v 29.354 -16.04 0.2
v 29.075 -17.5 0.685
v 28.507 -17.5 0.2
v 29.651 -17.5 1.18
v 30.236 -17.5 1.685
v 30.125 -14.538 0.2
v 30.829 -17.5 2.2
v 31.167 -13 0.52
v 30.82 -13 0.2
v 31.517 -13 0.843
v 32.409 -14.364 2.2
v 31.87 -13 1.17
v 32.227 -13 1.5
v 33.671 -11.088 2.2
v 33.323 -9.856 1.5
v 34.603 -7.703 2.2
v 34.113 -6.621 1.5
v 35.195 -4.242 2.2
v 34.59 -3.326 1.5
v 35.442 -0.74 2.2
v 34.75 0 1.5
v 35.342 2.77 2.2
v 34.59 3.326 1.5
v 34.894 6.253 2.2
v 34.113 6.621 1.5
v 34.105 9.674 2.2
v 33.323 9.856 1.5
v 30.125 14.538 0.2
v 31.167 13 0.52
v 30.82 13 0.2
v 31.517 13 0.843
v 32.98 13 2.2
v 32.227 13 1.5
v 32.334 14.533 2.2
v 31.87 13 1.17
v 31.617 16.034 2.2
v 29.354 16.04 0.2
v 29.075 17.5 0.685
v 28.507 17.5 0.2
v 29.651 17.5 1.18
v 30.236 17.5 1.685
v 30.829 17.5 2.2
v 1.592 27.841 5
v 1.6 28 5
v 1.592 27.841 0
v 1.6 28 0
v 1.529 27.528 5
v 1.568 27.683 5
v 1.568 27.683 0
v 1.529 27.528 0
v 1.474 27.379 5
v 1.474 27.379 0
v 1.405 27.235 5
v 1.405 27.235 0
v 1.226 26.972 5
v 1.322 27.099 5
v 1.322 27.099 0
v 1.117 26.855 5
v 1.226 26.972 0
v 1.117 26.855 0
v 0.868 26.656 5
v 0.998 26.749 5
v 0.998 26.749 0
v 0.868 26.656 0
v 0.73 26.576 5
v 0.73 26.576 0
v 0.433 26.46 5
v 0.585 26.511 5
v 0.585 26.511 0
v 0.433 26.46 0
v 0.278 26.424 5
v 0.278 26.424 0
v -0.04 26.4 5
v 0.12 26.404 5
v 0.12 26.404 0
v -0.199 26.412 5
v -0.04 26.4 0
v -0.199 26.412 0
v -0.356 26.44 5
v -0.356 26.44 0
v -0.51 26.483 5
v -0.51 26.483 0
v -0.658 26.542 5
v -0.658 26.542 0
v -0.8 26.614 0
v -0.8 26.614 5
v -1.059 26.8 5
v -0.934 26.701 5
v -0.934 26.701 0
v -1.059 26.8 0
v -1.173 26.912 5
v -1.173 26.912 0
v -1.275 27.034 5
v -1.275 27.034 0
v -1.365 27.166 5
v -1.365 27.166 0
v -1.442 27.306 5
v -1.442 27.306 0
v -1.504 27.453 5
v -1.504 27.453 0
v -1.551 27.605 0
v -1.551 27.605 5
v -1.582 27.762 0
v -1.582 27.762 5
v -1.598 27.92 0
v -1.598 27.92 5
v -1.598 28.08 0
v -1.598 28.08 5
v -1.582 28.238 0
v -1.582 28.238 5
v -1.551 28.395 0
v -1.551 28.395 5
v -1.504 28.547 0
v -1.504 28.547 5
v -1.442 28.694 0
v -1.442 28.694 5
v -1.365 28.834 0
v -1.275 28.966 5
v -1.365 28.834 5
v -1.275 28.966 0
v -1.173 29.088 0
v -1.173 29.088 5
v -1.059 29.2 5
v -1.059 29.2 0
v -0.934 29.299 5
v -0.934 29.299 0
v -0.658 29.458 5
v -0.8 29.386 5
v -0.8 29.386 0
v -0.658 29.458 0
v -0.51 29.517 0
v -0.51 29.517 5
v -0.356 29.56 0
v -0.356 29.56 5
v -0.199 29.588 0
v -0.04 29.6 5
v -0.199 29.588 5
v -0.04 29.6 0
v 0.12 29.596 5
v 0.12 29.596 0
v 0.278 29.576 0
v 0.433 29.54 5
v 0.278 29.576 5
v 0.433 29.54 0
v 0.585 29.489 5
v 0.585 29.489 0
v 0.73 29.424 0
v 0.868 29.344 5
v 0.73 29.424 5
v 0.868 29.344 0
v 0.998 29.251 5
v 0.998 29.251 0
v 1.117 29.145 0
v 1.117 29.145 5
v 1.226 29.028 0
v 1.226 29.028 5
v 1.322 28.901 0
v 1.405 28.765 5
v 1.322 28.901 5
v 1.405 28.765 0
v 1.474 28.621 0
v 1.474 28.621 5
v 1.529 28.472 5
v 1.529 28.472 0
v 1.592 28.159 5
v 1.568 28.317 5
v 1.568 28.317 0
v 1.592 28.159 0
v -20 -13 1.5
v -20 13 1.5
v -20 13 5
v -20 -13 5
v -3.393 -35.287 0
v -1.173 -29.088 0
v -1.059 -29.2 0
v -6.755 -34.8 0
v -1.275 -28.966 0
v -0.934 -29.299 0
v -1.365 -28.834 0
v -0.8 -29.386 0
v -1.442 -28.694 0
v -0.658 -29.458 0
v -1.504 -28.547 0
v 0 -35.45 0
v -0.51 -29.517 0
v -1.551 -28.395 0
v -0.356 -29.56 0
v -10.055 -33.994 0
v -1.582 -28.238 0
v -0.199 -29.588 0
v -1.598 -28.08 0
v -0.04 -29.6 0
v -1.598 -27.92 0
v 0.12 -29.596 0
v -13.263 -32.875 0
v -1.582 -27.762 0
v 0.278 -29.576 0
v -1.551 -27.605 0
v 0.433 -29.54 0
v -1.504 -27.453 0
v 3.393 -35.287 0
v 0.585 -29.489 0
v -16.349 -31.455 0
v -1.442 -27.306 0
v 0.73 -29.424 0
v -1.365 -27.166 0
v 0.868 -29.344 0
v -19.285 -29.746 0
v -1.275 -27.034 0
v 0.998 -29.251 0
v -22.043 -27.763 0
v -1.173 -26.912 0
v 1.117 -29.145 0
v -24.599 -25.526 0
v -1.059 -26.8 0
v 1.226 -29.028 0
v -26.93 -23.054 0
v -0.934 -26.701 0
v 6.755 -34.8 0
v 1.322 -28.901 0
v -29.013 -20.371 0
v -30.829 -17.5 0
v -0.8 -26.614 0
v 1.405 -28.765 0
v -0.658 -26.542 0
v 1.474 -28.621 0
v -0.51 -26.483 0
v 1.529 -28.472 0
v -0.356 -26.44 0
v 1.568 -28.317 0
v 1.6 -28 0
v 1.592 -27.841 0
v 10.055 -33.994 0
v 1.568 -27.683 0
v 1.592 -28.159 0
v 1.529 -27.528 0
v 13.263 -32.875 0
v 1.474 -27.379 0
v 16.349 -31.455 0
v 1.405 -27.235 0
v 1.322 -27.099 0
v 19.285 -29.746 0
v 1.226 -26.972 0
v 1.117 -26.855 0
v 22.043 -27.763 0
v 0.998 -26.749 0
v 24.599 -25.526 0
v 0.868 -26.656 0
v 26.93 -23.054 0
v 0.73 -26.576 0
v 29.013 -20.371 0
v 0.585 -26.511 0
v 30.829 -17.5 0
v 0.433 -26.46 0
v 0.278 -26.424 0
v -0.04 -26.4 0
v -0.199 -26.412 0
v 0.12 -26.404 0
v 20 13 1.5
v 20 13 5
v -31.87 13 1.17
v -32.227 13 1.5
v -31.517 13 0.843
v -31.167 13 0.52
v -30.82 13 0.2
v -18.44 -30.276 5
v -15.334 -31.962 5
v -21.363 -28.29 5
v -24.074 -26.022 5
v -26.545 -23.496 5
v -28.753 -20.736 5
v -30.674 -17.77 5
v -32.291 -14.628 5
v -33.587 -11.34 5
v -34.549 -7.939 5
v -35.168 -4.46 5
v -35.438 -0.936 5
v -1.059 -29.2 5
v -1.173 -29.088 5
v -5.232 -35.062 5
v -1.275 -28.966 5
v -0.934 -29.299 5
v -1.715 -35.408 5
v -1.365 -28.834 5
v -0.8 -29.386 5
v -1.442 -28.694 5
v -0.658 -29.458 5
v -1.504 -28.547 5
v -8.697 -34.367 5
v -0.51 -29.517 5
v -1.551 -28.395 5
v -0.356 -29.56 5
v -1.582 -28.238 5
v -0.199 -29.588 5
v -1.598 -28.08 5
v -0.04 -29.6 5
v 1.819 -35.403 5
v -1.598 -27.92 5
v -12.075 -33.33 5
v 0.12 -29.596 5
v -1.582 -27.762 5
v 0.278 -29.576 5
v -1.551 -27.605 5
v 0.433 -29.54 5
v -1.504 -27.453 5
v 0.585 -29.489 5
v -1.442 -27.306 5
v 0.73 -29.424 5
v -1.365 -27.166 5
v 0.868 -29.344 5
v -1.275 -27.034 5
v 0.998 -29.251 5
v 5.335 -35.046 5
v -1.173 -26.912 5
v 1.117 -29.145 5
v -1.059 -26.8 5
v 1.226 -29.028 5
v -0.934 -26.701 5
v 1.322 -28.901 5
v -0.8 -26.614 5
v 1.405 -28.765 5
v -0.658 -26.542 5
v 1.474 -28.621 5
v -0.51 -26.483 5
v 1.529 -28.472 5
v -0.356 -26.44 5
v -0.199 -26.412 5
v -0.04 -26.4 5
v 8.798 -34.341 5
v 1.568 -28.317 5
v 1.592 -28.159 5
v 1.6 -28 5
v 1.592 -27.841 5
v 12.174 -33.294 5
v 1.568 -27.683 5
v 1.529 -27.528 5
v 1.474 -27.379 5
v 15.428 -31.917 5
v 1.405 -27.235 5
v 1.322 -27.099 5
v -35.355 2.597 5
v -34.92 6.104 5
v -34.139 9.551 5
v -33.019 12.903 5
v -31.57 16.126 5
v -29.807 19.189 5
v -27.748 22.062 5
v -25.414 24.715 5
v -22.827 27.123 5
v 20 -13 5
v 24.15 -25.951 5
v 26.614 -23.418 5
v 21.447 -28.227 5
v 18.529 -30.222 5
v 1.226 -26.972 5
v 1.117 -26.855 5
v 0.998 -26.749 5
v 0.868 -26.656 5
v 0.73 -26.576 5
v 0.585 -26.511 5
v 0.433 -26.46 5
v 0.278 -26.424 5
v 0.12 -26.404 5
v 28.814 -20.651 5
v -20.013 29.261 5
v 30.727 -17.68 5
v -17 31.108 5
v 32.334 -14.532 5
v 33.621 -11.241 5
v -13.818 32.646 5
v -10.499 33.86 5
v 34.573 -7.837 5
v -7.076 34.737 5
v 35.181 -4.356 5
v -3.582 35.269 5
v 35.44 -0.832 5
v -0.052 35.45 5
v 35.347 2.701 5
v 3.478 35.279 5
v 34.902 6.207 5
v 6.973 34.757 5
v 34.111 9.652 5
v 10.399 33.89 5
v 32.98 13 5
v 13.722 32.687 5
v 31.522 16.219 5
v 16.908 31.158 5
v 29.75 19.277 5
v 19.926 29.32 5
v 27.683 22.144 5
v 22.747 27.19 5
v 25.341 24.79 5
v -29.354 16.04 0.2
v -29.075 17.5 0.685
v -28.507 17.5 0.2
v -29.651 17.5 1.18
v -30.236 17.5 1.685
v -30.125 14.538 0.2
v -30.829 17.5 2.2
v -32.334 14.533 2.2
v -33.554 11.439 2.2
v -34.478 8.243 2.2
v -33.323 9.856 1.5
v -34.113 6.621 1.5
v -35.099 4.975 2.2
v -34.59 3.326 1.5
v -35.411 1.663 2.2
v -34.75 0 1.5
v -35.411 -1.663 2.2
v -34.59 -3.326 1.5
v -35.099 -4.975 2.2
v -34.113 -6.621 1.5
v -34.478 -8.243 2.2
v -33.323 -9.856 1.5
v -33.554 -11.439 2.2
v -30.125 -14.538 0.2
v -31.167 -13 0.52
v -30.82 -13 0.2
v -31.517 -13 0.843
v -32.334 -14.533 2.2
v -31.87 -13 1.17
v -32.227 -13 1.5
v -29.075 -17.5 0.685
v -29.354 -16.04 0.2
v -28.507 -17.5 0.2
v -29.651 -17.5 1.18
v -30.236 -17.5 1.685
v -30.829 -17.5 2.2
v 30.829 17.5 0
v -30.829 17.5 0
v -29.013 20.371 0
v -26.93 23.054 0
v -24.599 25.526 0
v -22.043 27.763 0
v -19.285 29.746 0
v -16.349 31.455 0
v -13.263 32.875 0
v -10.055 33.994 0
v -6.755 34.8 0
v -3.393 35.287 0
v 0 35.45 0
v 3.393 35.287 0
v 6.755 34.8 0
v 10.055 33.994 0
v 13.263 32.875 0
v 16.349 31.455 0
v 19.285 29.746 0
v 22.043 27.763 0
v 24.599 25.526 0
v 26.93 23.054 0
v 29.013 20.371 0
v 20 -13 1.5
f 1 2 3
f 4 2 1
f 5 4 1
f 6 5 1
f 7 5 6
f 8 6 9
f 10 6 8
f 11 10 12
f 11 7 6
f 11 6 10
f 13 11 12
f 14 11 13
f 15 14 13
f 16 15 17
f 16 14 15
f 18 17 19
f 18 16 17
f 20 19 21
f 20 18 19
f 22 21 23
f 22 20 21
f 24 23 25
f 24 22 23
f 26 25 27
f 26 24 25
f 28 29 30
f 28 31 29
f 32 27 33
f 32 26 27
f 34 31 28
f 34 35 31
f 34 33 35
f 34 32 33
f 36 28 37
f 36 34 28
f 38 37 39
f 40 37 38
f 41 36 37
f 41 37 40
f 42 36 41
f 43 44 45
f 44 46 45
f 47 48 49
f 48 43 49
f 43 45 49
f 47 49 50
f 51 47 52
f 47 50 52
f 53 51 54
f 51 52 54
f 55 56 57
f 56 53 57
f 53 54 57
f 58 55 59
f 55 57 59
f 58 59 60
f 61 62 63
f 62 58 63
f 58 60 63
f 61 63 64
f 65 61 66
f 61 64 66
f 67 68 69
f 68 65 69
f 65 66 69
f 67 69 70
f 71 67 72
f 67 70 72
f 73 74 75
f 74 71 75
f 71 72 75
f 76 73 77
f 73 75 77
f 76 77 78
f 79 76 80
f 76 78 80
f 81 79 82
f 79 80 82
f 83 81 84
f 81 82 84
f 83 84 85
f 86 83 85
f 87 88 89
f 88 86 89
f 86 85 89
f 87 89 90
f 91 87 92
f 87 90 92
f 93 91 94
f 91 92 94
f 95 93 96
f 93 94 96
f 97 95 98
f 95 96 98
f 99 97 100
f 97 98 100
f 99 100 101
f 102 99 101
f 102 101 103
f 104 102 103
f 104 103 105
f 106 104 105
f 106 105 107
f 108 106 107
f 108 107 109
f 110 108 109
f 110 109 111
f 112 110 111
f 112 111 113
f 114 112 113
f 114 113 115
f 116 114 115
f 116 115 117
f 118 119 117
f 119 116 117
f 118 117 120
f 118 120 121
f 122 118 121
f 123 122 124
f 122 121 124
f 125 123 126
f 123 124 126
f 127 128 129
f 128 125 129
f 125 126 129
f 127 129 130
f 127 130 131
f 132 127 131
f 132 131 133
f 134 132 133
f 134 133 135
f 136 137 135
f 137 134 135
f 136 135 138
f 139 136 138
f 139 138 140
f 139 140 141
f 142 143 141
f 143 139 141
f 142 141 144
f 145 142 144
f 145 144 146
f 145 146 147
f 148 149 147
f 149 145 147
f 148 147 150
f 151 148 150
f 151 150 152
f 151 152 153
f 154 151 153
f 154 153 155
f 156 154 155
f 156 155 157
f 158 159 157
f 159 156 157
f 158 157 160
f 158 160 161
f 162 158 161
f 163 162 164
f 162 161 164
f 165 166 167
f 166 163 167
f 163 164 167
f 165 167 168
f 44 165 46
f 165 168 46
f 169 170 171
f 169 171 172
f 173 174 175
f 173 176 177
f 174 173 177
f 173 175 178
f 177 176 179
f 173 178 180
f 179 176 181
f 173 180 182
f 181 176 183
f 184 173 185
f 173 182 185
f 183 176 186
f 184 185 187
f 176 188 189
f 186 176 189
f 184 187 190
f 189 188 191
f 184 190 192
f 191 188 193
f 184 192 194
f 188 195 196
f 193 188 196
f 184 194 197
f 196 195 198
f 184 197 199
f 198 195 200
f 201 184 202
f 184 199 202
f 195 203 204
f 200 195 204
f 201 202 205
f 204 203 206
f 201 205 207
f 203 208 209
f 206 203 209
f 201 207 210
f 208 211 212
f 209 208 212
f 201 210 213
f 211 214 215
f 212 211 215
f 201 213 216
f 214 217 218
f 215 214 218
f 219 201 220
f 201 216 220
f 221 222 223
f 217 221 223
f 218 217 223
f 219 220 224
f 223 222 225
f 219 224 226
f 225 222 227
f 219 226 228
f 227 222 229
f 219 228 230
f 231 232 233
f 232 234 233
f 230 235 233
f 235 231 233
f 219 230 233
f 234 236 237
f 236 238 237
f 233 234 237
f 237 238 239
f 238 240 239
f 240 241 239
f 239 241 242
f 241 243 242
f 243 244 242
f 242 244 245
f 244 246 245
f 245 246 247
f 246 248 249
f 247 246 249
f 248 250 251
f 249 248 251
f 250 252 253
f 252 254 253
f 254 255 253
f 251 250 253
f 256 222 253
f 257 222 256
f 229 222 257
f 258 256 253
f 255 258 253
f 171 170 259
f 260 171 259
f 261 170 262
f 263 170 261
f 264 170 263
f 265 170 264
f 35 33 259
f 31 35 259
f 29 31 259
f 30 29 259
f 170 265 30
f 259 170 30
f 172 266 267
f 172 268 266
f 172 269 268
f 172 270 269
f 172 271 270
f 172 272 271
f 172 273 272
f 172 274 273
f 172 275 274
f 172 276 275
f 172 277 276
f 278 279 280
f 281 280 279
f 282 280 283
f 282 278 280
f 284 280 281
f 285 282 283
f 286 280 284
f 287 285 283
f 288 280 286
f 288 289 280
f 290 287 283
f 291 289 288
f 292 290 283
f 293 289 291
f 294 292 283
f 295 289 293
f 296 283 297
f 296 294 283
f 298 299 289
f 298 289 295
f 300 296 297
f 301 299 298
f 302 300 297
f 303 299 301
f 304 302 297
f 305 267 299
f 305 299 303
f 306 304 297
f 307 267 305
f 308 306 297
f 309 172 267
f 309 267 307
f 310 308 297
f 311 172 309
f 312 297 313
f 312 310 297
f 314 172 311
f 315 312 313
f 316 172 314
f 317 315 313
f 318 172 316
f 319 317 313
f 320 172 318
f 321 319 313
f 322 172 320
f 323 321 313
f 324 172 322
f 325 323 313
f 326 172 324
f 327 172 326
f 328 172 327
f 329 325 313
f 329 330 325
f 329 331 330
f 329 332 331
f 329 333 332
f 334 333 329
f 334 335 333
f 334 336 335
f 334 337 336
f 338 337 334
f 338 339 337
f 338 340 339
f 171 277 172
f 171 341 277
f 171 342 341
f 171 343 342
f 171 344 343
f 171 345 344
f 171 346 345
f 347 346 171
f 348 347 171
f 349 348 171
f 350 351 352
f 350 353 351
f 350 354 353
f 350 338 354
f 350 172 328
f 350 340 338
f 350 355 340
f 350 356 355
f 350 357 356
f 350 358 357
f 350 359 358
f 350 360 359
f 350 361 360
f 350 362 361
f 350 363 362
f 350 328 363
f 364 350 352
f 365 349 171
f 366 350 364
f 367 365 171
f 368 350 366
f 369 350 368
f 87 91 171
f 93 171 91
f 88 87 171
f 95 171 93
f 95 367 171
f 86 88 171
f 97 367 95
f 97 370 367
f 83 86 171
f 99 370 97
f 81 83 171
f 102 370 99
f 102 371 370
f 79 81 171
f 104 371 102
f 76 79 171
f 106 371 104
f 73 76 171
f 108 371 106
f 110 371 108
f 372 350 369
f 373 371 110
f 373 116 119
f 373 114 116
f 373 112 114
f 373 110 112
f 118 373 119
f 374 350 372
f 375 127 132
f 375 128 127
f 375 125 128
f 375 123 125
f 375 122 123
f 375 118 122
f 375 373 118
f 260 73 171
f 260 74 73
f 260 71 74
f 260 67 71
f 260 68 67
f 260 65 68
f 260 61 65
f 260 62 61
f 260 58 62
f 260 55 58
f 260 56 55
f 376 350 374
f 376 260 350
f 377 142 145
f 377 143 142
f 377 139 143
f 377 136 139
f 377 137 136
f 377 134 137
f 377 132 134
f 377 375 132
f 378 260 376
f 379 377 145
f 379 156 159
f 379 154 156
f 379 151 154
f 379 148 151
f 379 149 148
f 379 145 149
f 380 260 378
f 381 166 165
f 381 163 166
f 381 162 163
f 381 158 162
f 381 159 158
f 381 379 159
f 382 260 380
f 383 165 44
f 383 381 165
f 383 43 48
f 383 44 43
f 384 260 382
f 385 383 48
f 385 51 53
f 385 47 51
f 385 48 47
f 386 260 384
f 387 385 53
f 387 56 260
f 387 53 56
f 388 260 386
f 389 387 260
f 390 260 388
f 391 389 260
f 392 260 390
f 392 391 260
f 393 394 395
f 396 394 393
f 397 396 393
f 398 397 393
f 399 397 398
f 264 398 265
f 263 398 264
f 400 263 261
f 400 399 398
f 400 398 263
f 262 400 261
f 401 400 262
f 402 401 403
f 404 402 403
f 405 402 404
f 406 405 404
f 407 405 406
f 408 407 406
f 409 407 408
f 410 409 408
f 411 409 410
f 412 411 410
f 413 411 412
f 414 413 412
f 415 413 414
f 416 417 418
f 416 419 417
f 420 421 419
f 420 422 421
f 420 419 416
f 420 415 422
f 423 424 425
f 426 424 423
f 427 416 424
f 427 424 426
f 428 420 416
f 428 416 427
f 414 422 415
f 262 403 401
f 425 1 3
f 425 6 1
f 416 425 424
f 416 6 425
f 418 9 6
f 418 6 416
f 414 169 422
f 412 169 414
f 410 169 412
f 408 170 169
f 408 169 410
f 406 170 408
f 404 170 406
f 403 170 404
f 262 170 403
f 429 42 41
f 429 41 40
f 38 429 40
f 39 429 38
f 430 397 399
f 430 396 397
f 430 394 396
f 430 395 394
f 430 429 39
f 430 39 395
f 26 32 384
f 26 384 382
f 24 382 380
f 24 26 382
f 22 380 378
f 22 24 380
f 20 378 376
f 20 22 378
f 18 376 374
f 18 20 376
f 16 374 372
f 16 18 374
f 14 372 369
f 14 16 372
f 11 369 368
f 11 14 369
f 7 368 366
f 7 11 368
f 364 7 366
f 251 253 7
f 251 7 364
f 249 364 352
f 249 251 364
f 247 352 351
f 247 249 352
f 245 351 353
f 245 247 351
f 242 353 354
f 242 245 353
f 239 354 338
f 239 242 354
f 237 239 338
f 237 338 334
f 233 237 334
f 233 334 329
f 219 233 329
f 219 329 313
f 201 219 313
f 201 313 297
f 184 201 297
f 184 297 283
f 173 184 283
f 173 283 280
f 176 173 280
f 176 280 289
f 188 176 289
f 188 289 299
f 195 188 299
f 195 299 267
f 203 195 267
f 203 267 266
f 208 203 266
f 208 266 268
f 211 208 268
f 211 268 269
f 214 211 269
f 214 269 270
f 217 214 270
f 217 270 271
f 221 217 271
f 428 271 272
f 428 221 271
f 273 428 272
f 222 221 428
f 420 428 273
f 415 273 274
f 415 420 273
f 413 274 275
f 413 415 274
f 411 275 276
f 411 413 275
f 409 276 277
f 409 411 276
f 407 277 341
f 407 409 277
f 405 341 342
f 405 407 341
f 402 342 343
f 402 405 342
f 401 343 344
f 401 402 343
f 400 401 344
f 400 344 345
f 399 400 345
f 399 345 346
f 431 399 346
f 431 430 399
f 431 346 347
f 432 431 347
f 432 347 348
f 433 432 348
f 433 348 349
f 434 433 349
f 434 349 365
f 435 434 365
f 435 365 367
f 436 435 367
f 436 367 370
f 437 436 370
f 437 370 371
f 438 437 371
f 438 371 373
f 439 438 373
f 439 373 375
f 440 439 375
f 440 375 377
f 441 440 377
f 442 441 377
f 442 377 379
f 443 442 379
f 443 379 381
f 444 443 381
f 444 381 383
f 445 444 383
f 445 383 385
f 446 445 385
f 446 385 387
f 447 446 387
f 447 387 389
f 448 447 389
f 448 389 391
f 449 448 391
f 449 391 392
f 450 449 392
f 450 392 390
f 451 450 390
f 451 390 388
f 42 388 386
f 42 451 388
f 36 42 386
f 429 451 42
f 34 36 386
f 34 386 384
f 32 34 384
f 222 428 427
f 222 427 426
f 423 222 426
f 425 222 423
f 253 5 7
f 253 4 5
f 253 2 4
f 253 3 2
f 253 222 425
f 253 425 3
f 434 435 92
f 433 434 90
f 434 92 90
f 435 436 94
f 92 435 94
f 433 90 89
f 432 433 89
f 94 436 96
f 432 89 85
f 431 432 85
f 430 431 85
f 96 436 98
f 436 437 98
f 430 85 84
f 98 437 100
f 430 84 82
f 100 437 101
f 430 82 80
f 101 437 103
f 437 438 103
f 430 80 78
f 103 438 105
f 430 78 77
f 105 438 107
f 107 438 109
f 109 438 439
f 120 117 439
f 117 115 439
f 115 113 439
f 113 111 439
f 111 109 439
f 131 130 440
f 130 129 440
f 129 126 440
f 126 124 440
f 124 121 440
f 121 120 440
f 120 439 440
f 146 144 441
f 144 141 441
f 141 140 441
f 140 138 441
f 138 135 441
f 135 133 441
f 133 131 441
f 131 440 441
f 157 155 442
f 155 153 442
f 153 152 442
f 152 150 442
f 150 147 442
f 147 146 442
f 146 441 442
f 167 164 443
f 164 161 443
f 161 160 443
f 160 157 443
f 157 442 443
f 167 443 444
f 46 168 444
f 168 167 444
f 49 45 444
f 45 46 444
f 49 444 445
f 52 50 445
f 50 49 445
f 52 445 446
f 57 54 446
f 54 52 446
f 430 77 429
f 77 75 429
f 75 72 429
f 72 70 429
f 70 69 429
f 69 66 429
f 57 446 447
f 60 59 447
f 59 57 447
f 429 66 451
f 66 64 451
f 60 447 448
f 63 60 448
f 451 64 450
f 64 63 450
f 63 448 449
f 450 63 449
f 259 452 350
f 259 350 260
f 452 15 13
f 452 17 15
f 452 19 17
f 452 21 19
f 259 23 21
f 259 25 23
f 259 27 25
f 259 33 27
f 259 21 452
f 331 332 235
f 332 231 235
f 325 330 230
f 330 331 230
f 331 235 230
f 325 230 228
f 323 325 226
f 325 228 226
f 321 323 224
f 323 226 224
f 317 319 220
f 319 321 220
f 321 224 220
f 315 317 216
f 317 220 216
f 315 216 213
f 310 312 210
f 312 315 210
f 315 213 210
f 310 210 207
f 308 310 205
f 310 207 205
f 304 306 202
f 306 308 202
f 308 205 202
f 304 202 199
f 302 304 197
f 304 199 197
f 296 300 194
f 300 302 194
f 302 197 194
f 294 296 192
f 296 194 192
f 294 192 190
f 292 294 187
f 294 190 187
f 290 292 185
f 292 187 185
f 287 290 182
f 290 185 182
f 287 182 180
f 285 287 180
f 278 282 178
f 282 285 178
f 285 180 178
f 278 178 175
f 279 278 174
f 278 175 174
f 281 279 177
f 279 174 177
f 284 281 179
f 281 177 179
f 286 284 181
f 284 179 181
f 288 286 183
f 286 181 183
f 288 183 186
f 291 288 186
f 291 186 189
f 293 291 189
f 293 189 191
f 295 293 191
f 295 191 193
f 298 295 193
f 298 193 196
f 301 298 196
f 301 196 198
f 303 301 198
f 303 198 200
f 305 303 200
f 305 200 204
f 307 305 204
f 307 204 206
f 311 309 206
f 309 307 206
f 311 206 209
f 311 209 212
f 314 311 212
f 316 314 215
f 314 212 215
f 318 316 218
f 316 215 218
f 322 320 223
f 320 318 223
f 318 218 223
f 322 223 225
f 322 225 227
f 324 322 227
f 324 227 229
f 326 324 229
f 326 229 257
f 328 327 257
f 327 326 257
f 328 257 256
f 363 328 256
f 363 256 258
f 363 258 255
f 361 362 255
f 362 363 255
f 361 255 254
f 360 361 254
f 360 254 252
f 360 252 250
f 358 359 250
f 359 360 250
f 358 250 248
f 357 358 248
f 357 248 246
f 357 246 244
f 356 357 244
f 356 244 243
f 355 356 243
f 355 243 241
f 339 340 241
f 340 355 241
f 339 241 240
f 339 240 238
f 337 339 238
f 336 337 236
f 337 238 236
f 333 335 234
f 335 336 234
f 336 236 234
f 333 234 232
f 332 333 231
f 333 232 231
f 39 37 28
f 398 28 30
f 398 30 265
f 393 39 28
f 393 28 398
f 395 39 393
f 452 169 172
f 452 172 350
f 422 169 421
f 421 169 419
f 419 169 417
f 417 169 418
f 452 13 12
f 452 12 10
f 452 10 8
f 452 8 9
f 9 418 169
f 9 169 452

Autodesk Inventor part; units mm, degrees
ref_plane "YZ Plane" through (0, 0, 0) normal (1, 0, 0) x (0, 1, 0)
ref_plane "XZ Plane" through (0, 0, 0) normal (0, 1, 0) x (-1, 0, 0)
ref_plane "XY Plane" through (0, 0, 0) normal (0, 0, 1) x (1, 0, 0)
sketch "Sketch1" plane through (0, 0, 0) normal (0, 0, 1) x (1, 0, 0)
  circle A0 centre (0, 28) radius 1.6 projected
  circle A1 centre (0, -28) radius 1.6 projected
  arc A2 (-32.9803, -13) -> (32.9803, -13) centre (0, 0) ccw projected
  arc A3 (32.9803, -13) -> (32.9803, 13) centre (0, 0) ccw projected
  arc A4 (32.9803, 13) -> (-32.9803, 13) centre (0, 0) ccw projected
  arc A5 (-32.9803, 13) -> (-32.9803, -13) centre (0, 0) ccw projected
extrude "Extrusion1" add sketch "Sketch1" along normal blind 5
sketch "Sketch2" plane through (0, 0, 0) normal (0, 0, -1) x (-1, 0, 0)
  line L0 (-35.45, 17.5) -> (35.45, 17.5)
  line L1 (35.45, 17.5) -> (35.45, -17.5)
  line L2 (35.45, -17.5) -> (-35.45, -17.5)
  line L3 (-35.45, -17.5) -> (-35.45, 17.5)
  line L4 (-35.45, 17.5) -> (35.45, -17.5) construction
  line L5 (35.45, 17.5) -> (-35.45, -17.5) construction
  circle A0 centre (0, 0) radius 35.45 projected
  point P0 (-30.8294, 17.5)
  point P1 (-30.8294, -17.5)
  point P2 (30.8294, -17.5)
  point P3 (30.8294, 17.5)
  dimension "d2" = 35
extrude "Extrusion2" cut sketch "Sketch2" against normal blind 0.2 contours L0 A0 L2
sketch "Sketch3" plane through (0, 0, 0.2) normal (0, 0, -1) x (-1, 0, 0)
  line L0 (-20, -13) -> (-20, 13) projected
  line L1 (-20, 13) -> (20, 13) projected
  line L2 (20, 13) -> (20, -13) projected
  line L3 (20, -13) -> (-20, -13) projected
  circle A0 centre (0, 28) radius 1.6 projected
  circle A1 centre (0, -28) radius 1.6 projected
  circle A2 centre (0, 0) radius 34.25 projected
extrude "Extrusion3" cut sketch "Sketch3" against normal through all contours L0 L1 L2 L3
chamfer "Chamfer1" distance 2 angle 45 2 edges at (-35.45, 0, 0.2) (35.3622, -2.4938, 0.2)
sketch "Sketch4" plane through (0, 0, 0.2) normal (0, 0, -1) x (-1, 0, 0)
  line L0 (-20, 13) -> (20, 13) projected
  line L1 (20, -13) -> (-20, -13) projected
  line L2 (-20, -13) -> (-20, 13) projected
  line L3 (20, 13) -> (20, -13) projected
  circle A0 centre (0, 0) radius 35.45 projected
  line L4 (20, 13) -> (-20, 13) projected
  line L5 (-20, 13) -> (-32.9803, 13)
  line L6 (-20, 13) -> (-20, -13) projected
  line L7 (-20, -13) -> (-32.9803, -13)
  arc A1 (-30.8294, 17.5) -> (-30.8294, -17.5) centre (0, 0) ccw projected
  line L8 (-20, -13) -> (20, -13) projected
  line L9 (20, -13) -> (32.9803, -13)
  circle A2 centre (0, 0) radius 35.45 projected
  line L10 (20, -13) -> (20, 13) projected
  line L11 (20, 13) -> (32.9803, 13)
  point P0 (26.4902, -13)
extrude "Extrusion4" cut sketch "Sketch4" against normal blind 1.3 contours L2 L7 A0 L5 | L11 A0 L9 L3
properties part number "FilmGuide"
